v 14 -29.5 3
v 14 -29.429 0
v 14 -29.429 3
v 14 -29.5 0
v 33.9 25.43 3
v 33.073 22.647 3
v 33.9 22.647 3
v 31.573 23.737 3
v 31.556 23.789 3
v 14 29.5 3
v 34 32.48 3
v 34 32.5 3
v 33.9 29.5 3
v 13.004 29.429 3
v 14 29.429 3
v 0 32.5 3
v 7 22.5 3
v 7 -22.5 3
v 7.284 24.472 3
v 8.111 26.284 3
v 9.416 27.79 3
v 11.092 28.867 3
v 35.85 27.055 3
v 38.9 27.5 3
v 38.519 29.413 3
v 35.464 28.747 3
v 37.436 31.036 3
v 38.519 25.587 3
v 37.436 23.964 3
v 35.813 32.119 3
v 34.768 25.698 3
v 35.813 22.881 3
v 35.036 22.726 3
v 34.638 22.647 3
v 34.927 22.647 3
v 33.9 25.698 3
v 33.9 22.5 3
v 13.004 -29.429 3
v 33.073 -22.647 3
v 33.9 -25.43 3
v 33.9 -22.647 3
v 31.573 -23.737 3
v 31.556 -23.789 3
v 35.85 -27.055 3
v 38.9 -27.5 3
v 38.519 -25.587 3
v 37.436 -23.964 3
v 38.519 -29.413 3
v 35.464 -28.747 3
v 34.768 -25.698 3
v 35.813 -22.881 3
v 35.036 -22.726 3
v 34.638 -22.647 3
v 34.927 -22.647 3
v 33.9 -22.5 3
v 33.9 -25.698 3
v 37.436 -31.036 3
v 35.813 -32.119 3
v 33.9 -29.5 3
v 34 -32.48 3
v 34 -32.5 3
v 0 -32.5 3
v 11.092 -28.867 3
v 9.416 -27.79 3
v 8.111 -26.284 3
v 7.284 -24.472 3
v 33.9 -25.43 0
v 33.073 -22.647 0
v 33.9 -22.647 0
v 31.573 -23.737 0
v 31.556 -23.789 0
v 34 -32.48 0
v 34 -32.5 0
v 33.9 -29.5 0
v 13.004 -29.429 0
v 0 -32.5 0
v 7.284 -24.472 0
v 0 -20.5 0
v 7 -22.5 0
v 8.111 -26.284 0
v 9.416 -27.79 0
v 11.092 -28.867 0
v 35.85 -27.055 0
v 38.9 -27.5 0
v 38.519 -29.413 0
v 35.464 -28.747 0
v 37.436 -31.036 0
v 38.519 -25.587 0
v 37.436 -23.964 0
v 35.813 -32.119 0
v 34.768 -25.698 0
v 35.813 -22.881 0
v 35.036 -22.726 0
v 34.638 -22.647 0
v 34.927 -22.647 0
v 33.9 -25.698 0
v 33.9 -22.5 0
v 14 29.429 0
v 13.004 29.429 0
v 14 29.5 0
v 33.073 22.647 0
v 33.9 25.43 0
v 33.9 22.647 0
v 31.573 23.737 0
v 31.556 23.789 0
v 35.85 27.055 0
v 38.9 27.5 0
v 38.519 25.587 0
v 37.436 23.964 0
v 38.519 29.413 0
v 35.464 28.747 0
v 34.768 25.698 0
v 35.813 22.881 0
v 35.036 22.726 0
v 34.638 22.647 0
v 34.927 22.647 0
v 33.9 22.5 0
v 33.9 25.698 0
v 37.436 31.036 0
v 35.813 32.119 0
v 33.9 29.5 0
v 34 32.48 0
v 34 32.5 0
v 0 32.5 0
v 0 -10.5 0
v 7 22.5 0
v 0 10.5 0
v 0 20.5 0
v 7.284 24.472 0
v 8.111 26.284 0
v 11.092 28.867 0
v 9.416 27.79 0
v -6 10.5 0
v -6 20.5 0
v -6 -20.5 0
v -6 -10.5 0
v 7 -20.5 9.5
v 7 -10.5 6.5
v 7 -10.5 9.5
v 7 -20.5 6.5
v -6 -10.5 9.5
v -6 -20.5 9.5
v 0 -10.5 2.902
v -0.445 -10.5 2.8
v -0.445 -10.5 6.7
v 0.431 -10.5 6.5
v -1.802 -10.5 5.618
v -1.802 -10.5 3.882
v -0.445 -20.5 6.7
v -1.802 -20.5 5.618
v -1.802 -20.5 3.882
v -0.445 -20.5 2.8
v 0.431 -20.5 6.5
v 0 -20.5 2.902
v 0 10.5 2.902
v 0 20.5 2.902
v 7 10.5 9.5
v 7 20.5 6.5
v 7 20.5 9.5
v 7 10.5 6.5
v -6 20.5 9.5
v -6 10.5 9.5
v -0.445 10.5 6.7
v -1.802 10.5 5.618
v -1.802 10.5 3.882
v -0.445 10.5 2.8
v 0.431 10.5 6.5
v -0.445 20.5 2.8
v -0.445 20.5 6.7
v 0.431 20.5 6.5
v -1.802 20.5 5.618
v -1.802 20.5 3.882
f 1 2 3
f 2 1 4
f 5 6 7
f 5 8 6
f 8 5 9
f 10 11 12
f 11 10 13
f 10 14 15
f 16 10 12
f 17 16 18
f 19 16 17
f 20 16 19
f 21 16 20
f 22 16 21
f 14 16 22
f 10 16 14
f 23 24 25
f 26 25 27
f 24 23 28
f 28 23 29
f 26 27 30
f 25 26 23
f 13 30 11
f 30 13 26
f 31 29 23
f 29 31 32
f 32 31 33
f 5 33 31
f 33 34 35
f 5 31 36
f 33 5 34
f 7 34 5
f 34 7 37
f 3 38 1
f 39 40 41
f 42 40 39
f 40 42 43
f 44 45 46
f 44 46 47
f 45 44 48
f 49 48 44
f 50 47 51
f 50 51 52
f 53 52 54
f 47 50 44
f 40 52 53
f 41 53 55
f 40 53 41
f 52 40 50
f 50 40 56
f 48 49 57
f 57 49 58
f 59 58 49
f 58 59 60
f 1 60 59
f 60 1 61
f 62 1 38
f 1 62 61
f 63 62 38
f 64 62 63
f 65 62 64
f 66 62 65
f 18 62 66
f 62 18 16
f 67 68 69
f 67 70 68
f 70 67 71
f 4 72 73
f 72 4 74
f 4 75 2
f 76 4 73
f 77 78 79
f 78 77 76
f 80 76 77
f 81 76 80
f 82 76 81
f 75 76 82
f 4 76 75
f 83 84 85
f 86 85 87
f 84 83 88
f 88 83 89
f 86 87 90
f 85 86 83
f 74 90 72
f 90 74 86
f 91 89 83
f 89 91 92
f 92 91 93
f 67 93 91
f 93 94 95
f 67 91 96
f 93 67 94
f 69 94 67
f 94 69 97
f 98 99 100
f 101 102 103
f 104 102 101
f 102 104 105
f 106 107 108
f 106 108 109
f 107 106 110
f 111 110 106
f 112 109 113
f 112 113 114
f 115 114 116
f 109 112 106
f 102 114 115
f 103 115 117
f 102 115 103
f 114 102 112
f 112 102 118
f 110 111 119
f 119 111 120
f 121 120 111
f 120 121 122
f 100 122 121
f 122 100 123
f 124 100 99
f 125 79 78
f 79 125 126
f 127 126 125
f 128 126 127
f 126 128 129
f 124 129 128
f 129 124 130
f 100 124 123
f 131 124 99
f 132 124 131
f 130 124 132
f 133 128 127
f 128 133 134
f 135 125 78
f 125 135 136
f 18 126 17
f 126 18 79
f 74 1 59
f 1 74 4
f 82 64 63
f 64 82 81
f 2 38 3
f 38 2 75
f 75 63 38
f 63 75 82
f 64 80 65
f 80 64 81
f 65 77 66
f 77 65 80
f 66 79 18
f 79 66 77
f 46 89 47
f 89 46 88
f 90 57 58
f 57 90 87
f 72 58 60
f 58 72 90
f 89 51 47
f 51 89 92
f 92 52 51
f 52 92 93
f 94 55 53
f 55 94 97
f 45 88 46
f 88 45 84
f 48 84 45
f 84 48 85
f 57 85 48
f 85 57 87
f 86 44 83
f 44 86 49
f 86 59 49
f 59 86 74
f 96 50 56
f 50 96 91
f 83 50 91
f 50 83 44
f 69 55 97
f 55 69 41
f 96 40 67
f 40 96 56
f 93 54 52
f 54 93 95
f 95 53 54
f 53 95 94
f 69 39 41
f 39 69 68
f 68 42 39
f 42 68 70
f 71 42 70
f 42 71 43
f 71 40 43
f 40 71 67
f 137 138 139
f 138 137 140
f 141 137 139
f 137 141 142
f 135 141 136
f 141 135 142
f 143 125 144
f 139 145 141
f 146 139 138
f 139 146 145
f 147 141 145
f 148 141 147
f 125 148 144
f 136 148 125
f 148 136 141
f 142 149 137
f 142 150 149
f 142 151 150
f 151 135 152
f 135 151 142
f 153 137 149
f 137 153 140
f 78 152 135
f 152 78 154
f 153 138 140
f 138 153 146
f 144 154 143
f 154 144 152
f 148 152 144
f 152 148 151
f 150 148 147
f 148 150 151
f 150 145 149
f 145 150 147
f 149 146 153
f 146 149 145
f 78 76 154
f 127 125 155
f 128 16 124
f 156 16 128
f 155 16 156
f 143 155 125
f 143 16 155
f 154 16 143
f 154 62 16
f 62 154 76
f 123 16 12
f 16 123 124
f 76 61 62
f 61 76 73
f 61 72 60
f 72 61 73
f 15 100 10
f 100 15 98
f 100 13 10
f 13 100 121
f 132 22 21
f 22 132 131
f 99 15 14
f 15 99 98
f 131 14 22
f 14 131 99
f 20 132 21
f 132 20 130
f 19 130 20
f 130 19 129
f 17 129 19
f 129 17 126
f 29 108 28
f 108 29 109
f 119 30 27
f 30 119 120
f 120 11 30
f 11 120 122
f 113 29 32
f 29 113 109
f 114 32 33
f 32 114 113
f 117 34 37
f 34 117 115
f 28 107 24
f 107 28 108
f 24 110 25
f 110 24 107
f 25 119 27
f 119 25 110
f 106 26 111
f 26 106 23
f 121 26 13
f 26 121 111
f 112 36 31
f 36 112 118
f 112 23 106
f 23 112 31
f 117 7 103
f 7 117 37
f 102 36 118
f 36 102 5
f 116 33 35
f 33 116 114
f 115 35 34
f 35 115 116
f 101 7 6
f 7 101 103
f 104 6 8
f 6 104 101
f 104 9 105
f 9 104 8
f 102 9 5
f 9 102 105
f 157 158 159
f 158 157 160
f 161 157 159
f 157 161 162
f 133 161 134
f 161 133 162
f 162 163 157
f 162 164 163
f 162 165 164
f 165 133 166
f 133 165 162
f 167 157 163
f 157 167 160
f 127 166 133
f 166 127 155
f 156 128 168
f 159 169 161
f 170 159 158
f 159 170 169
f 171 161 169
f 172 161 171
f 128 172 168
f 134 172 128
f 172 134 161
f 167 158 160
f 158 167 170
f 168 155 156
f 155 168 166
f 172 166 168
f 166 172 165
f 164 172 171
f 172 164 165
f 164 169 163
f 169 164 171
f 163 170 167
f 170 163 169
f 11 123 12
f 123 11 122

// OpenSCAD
inner = 59;
thickness = 3;

outer = inner + 2 * thickness; 

union(){
	half();
	mirror([0,1,0]) half();
}

module half(){	
	translate ([0, -outer/2, 0]) union() {
		cube([7,outer,thickness]);
		translate([7,thickness,0]) difference () {
			cube([7,7,thickness]);
			translate([7,7,-1]) cylinder(r = 7, h = thickness + 2);
		}
		translate([7,0,0]) cube([27,thickness,thickness]);
		translate([33.9,thickness+2,0]) rotate([0,0,-90]) pie_slice(5, 2, 180, thickness);
		translate([34,thickness+4,0]) pie_slice(3, 0, 145, thickness);
		translate([-2*thickness,12,0]) {
			difference() {
				cube([7 + 2*thickness, 10, 2*thickness + 3.5]);
				translate([6,-0.5,thickness]) cube([8,11,3.5]);
				translate([6,-0.5,thickness + 1.75]) rotate([-90,0,0]) cylinder(r = 2, h = 11);
			}
		}
	}
}

///////////////////////////

module tube(outer_radius, inner_radius, height) {
    difference() {
        cylinder(h = height, r = outer_radius);
        translate([ 0, 0, -1]) cylinder(h = height + 2, r = inner_radius);
    }
}

module pie_slice(outer_radius, inner_radius, angle, height) {
    o1 = outer_radius + 1;
    blocking_half = [2* o1, o1, height + 1];
        blocking_quarter = [o1, o1, height + 1];
        if (angle <= 0) {
                //nothing
        } else if (angle <= 90) {
                difference() {
                        tube(outer_radius, inner_radius, height);
                        translate([-o1, -o1, -0.5]) cube(blocking_half);
                        translate([-o1, -0.5, -0.5]) cube(blocking_quarter);
                        rotate([0,0,angle]) translate([0, 0, -0.5]) cube(blocking_quarter);
                }
        } else if (angle <= 180) {
                difference() {
                        tube(outer_radius, inner_radius, height);
                        translate([-o1, -o1, -0.5]) cube(blocking_half);
                        rotate([0,0,angle]) translate([0, 0, -0.5]) cube(blocking_quarter);
                }
        } else if (angle <= 270) {
                difference() {
                        tube(outer_radius, inner_radius, height);
                        translate([0, -o1, -0.5]) cube(blocking_quarter);
                        rotate([0,0,angle]) translate([0, 0, -0.5]) cube(blocking_quarter);
                }
        } else if (angle <= 360) {
                difference() {
                        tube(outer_radius, inner_radius, height);
                        intersection() {
                                translate([0, -o1, -0.5]) cube(blocking_quarter);
                                rotate([0,0,angle]) translate([0, 0, -0.5]) cube(blocking_quarter);
                        }
                }
        } else {
                tube(outer_radius, inner_radius, height);
        }
}
